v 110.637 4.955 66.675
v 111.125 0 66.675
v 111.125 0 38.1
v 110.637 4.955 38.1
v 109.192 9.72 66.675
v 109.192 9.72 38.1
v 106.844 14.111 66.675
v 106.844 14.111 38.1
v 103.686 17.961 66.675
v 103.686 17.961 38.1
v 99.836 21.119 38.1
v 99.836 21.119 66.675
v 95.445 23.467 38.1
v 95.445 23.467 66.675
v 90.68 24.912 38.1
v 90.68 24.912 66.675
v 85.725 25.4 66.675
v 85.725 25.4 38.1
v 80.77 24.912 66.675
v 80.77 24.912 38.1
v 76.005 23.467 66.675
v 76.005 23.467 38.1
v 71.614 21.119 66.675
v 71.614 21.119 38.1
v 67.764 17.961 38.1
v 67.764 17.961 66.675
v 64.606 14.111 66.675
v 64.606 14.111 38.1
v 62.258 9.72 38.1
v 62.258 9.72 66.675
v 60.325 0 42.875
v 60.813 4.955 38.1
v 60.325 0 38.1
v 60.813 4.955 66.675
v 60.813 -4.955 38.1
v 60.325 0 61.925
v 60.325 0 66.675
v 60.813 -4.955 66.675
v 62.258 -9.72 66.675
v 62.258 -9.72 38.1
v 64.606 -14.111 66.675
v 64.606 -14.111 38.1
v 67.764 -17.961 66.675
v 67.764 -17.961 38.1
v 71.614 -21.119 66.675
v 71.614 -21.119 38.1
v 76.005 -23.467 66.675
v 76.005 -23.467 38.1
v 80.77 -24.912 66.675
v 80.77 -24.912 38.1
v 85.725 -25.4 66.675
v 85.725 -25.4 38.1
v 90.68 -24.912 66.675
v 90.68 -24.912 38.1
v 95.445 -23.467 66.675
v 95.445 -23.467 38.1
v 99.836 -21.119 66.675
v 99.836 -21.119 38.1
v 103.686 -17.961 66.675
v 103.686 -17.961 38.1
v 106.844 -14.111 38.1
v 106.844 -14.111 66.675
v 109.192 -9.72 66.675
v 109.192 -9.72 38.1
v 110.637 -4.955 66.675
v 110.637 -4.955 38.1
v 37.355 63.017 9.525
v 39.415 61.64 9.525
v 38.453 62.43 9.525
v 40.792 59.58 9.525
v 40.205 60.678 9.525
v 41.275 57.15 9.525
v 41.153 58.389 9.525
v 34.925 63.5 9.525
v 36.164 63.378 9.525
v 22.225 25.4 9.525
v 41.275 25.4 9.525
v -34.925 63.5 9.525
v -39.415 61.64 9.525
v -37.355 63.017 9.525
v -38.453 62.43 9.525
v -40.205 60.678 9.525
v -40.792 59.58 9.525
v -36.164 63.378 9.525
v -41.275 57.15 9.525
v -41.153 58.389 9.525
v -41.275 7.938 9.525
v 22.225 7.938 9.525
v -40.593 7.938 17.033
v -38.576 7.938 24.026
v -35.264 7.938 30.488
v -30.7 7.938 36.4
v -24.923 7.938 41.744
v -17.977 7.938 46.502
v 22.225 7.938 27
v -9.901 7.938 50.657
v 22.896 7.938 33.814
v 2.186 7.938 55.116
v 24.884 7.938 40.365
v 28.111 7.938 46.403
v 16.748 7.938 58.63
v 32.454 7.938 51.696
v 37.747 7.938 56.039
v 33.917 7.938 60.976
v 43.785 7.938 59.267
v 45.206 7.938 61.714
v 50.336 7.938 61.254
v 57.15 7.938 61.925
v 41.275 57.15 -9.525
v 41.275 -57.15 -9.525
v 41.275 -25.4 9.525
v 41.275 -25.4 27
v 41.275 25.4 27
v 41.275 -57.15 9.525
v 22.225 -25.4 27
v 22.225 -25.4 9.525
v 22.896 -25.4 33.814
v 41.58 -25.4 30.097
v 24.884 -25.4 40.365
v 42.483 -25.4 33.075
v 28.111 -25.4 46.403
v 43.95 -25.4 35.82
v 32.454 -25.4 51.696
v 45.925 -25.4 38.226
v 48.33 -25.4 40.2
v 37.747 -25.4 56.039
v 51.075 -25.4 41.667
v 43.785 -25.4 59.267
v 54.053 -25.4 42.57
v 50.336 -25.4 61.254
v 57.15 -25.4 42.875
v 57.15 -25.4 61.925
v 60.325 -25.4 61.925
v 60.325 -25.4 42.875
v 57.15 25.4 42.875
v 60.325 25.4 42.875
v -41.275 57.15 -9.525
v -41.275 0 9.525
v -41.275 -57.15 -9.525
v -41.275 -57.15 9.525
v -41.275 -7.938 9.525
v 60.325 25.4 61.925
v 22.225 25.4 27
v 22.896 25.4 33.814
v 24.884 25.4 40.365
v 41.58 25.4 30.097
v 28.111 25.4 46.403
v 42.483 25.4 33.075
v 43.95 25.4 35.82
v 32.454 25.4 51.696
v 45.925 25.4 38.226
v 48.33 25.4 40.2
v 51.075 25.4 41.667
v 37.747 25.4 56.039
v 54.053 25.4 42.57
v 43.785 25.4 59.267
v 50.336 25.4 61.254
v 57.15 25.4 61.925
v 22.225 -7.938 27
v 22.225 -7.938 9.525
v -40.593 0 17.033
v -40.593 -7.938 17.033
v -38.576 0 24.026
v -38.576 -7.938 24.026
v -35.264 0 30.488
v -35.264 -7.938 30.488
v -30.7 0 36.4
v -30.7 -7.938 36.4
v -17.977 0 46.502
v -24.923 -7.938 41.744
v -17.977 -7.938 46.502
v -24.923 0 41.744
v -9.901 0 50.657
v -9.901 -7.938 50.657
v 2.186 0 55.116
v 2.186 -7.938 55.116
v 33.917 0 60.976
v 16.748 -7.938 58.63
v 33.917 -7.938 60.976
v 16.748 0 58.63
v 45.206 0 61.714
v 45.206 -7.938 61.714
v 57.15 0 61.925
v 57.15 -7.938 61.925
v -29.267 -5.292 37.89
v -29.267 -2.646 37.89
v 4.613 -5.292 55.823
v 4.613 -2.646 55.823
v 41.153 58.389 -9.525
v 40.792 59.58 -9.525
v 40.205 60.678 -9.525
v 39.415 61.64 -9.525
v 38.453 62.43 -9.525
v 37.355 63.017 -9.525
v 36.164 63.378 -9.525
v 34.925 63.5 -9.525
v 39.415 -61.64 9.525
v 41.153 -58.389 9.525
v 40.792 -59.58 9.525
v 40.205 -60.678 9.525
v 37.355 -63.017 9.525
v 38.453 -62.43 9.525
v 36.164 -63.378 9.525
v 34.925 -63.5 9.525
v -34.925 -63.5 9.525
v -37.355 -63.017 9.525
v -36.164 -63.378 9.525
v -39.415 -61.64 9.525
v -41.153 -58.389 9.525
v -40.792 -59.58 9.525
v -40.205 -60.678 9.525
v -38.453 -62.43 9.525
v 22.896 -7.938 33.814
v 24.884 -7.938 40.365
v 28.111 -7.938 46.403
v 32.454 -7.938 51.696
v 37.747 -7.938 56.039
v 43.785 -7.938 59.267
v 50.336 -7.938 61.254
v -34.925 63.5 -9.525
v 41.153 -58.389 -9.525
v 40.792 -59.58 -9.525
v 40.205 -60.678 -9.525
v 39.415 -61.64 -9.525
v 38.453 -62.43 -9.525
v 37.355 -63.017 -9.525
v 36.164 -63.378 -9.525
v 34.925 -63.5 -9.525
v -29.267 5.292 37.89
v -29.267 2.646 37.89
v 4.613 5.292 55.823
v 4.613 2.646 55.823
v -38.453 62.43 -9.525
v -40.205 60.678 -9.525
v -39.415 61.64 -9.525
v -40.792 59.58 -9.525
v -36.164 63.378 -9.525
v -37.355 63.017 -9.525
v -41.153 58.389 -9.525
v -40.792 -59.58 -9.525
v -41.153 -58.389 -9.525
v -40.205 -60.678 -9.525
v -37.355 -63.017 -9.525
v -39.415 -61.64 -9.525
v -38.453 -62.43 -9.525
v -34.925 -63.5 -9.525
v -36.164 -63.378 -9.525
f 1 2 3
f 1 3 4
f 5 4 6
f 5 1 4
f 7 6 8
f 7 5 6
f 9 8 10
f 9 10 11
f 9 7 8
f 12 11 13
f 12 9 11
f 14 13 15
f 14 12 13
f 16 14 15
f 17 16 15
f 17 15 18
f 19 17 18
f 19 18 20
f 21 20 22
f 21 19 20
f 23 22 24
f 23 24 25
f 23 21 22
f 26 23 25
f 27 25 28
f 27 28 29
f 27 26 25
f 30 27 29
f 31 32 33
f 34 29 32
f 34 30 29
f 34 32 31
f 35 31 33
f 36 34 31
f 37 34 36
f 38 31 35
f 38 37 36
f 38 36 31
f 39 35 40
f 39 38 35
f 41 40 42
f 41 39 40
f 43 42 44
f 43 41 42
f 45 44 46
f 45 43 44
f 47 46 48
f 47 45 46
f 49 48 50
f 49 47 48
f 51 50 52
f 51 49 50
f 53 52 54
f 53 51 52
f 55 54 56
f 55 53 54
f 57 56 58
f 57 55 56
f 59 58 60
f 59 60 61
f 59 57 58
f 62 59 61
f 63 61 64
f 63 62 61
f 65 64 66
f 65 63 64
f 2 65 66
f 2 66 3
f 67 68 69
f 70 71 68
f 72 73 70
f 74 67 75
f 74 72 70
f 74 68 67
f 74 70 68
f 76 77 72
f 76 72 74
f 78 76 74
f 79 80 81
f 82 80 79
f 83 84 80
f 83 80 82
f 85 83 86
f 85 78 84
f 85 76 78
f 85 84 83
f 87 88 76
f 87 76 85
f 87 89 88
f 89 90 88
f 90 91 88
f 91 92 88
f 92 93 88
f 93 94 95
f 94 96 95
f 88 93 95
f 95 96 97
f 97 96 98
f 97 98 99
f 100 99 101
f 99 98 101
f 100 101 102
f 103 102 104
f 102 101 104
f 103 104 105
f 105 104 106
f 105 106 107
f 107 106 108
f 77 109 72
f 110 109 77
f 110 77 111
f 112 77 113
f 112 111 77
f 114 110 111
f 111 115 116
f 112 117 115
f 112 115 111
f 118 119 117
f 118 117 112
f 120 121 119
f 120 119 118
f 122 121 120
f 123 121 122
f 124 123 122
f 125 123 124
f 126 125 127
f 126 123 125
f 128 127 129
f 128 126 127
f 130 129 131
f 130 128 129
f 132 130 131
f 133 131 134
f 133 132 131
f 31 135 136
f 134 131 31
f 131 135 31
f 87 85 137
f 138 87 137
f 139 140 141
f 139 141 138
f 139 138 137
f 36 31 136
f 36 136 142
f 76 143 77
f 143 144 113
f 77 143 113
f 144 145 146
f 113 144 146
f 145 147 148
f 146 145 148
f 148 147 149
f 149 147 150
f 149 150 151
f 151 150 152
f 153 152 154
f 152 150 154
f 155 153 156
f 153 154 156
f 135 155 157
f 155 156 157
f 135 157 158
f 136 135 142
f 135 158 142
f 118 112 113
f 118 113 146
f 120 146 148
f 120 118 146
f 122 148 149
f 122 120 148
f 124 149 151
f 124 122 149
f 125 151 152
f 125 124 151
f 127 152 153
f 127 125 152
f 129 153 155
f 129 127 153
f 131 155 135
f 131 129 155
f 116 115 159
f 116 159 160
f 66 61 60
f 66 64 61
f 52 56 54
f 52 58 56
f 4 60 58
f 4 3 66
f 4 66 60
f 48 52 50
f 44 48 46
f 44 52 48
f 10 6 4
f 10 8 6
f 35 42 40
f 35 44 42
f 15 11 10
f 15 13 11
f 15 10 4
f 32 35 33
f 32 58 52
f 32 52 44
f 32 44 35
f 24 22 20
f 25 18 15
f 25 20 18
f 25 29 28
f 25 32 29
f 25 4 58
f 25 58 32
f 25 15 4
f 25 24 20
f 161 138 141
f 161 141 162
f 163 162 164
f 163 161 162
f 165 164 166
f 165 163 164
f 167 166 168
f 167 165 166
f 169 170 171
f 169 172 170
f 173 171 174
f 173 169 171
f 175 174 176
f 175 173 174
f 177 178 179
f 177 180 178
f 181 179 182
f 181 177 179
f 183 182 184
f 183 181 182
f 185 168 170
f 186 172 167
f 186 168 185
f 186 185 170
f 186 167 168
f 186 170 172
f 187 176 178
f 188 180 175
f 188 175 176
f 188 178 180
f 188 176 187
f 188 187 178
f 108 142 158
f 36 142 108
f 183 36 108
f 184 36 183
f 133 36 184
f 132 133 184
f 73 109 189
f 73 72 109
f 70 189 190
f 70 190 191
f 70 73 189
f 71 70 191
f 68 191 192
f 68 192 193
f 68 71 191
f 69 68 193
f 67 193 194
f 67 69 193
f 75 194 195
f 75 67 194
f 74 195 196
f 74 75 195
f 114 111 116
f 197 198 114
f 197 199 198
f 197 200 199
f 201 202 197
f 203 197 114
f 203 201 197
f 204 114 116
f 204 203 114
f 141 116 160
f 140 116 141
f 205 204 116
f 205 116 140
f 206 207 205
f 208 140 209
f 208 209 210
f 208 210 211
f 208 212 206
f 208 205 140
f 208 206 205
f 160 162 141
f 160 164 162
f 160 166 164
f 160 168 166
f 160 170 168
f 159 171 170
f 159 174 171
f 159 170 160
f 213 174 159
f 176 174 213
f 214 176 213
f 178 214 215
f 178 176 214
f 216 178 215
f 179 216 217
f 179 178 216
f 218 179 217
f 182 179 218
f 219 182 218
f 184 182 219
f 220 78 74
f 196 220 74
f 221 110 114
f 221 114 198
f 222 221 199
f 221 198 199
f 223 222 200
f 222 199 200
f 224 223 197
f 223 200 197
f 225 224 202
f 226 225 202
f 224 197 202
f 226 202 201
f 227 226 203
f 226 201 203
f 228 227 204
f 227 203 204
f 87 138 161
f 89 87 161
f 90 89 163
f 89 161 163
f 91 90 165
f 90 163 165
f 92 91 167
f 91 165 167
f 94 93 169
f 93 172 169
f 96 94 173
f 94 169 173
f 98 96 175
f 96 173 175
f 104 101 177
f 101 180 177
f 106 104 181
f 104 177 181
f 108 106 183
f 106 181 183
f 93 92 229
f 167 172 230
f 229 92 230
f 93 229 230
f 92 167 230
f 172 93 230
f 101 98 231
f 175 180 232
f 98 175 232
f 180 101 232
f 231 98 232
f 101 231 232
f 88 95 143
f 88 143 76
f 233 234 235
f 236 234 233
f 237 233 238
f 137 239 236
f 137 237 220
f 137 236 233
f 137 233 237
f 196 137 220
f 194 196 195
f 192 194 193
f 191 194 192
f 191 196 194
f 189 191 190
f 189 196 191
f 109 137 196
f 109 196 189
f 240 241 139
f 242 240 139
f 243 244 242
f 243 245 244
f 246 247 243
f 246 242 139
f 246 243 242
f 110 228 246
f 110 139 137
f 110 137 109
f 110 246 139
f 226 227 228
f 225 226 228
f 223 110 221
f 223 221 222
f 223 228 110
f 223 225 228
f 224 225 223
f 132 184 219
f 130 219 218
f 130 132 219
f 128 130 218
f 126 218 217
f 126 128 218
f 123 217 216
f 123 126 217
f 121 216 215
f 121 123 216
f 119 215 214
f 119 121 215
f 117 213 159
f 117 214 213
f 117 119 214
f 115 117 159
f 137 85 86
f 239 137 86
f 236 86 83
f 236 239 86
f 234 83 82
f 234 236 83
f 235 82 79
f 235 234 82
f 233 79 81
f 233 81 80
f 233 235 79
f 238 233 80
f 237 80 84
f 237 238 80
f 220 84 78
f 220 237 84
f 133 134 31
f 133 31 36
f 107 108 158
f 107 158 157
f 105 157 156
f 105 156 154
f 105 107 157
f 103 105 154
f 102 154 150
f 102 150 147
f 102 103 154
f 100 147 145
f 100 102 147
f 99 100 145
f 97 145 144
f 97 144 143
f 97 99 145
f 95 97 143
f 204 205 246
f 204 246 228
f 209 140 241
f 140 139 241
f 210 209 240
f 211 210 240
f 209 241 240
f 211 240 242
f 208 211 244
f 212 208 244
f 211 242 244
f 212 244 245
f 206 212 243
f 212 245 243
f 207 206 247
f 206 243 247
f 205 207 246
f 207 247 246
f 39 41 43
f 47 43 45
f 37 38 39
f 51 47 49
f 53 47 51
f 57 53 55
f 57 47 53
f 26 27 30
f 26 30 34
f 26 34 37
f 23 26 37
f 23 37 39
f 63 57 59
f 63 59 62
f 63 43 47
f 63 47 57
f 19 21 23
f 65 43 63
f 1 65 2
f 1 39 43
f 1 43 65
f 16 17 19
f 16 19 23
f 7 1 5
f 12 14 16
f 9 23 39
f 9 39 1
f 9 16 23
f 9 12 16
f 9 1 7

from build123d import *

# Parameters (mm, degrees)
F1_DEPTH = 63.5
F2_DEPTH = 25.4
F3_DEPTH = 7.9375
F5_R     = 6.35


with BuildPart() as f1:
    # F0 (on Front) → F1 (new body, symmetric)
    with BuildSketch(Plane.XZ):
        Polygon((41.275, -9.525), (41.275, 9.525), (22.225, 9.525), (-41.275, 9.525), (-41.275, -9.525), align=None)
    extrude(amount=F1_DEPTH, both=True)

    # F0 (on Front) → F2 (join, symmetric)
    with BuildSketch(Plane.XZ):
        with BuildLine():
            Line((22.225, 9.525), (41.275, 9.525))
            Line((41.275, 9.525), (41.275, 27.0002))
            ThreePointArc((41.275, 27.0002), (45.92468, 38.22552), (57.15, 42.8752))
            Line((57.15, 42.8752), (60.325, 42.8752))
            Line((60.325, 42.8752), (60.325, 61.9252))
            Line((60.325, 61.9252), (57.15, 61.9252))
            ThreePointArc((57.15, 61.9252), (32.454296, 51.695904), (22.225, 27.0002))
            Line((22.225, 27.0002), (22.225, 9.525))
        make_face()
    extrude(amount=F2_DEPTH, both=True)

    # F0 (on Front) → F3 (join, symmetric)
    with BuildSketch(Plane.XZ):
        with BuildLine():
            Line((-41.275, 9.525), (22.225, 9.525))
            Line((22.225, 9.525), (22.225, 27.0002))
            ThreePointArc((22.225, 27.0002), (32.454296, 51.695904), (57.15, 61.9252))
            add(Edge.make_bspline(
                [(-41.275, 9.525), (-41.275, 42.640955), (-3.642555, 62.20321), (57.15, 61.9252)],
                knots=[0, 0, 0, 0, 111.504536, 111.504536, 111.504536, 111.504536], degree=3))
        make_face()
    extrude(amount=F3_DEPTH, both=True)

    # F0 (on Front) → F4 (revolve)
    with BuildSketch(Plane.XZ):
        Polygon((85.725, 61.9252), (85.725, 42.8752), (85.725, 38.1), (111.125, 38.1), (111.125, 66.675), (85.725, 66.675), align=None)
    revolve(axis=Axis((85.725, 0, 52.3875), (0, 0, 1)))

    # F5
    f5_edges = [f1.edges().sort_by_distance(p)[0] for p in [
        (41.275, -63.5, 0),
        (41.275, 63.5, 0),
        (-41.275, 63.5, 0),
        (-41.275, -63.5, 0),
    ]]
    fillet(f5_edges, radius=F5_R)


solid = f1.part
